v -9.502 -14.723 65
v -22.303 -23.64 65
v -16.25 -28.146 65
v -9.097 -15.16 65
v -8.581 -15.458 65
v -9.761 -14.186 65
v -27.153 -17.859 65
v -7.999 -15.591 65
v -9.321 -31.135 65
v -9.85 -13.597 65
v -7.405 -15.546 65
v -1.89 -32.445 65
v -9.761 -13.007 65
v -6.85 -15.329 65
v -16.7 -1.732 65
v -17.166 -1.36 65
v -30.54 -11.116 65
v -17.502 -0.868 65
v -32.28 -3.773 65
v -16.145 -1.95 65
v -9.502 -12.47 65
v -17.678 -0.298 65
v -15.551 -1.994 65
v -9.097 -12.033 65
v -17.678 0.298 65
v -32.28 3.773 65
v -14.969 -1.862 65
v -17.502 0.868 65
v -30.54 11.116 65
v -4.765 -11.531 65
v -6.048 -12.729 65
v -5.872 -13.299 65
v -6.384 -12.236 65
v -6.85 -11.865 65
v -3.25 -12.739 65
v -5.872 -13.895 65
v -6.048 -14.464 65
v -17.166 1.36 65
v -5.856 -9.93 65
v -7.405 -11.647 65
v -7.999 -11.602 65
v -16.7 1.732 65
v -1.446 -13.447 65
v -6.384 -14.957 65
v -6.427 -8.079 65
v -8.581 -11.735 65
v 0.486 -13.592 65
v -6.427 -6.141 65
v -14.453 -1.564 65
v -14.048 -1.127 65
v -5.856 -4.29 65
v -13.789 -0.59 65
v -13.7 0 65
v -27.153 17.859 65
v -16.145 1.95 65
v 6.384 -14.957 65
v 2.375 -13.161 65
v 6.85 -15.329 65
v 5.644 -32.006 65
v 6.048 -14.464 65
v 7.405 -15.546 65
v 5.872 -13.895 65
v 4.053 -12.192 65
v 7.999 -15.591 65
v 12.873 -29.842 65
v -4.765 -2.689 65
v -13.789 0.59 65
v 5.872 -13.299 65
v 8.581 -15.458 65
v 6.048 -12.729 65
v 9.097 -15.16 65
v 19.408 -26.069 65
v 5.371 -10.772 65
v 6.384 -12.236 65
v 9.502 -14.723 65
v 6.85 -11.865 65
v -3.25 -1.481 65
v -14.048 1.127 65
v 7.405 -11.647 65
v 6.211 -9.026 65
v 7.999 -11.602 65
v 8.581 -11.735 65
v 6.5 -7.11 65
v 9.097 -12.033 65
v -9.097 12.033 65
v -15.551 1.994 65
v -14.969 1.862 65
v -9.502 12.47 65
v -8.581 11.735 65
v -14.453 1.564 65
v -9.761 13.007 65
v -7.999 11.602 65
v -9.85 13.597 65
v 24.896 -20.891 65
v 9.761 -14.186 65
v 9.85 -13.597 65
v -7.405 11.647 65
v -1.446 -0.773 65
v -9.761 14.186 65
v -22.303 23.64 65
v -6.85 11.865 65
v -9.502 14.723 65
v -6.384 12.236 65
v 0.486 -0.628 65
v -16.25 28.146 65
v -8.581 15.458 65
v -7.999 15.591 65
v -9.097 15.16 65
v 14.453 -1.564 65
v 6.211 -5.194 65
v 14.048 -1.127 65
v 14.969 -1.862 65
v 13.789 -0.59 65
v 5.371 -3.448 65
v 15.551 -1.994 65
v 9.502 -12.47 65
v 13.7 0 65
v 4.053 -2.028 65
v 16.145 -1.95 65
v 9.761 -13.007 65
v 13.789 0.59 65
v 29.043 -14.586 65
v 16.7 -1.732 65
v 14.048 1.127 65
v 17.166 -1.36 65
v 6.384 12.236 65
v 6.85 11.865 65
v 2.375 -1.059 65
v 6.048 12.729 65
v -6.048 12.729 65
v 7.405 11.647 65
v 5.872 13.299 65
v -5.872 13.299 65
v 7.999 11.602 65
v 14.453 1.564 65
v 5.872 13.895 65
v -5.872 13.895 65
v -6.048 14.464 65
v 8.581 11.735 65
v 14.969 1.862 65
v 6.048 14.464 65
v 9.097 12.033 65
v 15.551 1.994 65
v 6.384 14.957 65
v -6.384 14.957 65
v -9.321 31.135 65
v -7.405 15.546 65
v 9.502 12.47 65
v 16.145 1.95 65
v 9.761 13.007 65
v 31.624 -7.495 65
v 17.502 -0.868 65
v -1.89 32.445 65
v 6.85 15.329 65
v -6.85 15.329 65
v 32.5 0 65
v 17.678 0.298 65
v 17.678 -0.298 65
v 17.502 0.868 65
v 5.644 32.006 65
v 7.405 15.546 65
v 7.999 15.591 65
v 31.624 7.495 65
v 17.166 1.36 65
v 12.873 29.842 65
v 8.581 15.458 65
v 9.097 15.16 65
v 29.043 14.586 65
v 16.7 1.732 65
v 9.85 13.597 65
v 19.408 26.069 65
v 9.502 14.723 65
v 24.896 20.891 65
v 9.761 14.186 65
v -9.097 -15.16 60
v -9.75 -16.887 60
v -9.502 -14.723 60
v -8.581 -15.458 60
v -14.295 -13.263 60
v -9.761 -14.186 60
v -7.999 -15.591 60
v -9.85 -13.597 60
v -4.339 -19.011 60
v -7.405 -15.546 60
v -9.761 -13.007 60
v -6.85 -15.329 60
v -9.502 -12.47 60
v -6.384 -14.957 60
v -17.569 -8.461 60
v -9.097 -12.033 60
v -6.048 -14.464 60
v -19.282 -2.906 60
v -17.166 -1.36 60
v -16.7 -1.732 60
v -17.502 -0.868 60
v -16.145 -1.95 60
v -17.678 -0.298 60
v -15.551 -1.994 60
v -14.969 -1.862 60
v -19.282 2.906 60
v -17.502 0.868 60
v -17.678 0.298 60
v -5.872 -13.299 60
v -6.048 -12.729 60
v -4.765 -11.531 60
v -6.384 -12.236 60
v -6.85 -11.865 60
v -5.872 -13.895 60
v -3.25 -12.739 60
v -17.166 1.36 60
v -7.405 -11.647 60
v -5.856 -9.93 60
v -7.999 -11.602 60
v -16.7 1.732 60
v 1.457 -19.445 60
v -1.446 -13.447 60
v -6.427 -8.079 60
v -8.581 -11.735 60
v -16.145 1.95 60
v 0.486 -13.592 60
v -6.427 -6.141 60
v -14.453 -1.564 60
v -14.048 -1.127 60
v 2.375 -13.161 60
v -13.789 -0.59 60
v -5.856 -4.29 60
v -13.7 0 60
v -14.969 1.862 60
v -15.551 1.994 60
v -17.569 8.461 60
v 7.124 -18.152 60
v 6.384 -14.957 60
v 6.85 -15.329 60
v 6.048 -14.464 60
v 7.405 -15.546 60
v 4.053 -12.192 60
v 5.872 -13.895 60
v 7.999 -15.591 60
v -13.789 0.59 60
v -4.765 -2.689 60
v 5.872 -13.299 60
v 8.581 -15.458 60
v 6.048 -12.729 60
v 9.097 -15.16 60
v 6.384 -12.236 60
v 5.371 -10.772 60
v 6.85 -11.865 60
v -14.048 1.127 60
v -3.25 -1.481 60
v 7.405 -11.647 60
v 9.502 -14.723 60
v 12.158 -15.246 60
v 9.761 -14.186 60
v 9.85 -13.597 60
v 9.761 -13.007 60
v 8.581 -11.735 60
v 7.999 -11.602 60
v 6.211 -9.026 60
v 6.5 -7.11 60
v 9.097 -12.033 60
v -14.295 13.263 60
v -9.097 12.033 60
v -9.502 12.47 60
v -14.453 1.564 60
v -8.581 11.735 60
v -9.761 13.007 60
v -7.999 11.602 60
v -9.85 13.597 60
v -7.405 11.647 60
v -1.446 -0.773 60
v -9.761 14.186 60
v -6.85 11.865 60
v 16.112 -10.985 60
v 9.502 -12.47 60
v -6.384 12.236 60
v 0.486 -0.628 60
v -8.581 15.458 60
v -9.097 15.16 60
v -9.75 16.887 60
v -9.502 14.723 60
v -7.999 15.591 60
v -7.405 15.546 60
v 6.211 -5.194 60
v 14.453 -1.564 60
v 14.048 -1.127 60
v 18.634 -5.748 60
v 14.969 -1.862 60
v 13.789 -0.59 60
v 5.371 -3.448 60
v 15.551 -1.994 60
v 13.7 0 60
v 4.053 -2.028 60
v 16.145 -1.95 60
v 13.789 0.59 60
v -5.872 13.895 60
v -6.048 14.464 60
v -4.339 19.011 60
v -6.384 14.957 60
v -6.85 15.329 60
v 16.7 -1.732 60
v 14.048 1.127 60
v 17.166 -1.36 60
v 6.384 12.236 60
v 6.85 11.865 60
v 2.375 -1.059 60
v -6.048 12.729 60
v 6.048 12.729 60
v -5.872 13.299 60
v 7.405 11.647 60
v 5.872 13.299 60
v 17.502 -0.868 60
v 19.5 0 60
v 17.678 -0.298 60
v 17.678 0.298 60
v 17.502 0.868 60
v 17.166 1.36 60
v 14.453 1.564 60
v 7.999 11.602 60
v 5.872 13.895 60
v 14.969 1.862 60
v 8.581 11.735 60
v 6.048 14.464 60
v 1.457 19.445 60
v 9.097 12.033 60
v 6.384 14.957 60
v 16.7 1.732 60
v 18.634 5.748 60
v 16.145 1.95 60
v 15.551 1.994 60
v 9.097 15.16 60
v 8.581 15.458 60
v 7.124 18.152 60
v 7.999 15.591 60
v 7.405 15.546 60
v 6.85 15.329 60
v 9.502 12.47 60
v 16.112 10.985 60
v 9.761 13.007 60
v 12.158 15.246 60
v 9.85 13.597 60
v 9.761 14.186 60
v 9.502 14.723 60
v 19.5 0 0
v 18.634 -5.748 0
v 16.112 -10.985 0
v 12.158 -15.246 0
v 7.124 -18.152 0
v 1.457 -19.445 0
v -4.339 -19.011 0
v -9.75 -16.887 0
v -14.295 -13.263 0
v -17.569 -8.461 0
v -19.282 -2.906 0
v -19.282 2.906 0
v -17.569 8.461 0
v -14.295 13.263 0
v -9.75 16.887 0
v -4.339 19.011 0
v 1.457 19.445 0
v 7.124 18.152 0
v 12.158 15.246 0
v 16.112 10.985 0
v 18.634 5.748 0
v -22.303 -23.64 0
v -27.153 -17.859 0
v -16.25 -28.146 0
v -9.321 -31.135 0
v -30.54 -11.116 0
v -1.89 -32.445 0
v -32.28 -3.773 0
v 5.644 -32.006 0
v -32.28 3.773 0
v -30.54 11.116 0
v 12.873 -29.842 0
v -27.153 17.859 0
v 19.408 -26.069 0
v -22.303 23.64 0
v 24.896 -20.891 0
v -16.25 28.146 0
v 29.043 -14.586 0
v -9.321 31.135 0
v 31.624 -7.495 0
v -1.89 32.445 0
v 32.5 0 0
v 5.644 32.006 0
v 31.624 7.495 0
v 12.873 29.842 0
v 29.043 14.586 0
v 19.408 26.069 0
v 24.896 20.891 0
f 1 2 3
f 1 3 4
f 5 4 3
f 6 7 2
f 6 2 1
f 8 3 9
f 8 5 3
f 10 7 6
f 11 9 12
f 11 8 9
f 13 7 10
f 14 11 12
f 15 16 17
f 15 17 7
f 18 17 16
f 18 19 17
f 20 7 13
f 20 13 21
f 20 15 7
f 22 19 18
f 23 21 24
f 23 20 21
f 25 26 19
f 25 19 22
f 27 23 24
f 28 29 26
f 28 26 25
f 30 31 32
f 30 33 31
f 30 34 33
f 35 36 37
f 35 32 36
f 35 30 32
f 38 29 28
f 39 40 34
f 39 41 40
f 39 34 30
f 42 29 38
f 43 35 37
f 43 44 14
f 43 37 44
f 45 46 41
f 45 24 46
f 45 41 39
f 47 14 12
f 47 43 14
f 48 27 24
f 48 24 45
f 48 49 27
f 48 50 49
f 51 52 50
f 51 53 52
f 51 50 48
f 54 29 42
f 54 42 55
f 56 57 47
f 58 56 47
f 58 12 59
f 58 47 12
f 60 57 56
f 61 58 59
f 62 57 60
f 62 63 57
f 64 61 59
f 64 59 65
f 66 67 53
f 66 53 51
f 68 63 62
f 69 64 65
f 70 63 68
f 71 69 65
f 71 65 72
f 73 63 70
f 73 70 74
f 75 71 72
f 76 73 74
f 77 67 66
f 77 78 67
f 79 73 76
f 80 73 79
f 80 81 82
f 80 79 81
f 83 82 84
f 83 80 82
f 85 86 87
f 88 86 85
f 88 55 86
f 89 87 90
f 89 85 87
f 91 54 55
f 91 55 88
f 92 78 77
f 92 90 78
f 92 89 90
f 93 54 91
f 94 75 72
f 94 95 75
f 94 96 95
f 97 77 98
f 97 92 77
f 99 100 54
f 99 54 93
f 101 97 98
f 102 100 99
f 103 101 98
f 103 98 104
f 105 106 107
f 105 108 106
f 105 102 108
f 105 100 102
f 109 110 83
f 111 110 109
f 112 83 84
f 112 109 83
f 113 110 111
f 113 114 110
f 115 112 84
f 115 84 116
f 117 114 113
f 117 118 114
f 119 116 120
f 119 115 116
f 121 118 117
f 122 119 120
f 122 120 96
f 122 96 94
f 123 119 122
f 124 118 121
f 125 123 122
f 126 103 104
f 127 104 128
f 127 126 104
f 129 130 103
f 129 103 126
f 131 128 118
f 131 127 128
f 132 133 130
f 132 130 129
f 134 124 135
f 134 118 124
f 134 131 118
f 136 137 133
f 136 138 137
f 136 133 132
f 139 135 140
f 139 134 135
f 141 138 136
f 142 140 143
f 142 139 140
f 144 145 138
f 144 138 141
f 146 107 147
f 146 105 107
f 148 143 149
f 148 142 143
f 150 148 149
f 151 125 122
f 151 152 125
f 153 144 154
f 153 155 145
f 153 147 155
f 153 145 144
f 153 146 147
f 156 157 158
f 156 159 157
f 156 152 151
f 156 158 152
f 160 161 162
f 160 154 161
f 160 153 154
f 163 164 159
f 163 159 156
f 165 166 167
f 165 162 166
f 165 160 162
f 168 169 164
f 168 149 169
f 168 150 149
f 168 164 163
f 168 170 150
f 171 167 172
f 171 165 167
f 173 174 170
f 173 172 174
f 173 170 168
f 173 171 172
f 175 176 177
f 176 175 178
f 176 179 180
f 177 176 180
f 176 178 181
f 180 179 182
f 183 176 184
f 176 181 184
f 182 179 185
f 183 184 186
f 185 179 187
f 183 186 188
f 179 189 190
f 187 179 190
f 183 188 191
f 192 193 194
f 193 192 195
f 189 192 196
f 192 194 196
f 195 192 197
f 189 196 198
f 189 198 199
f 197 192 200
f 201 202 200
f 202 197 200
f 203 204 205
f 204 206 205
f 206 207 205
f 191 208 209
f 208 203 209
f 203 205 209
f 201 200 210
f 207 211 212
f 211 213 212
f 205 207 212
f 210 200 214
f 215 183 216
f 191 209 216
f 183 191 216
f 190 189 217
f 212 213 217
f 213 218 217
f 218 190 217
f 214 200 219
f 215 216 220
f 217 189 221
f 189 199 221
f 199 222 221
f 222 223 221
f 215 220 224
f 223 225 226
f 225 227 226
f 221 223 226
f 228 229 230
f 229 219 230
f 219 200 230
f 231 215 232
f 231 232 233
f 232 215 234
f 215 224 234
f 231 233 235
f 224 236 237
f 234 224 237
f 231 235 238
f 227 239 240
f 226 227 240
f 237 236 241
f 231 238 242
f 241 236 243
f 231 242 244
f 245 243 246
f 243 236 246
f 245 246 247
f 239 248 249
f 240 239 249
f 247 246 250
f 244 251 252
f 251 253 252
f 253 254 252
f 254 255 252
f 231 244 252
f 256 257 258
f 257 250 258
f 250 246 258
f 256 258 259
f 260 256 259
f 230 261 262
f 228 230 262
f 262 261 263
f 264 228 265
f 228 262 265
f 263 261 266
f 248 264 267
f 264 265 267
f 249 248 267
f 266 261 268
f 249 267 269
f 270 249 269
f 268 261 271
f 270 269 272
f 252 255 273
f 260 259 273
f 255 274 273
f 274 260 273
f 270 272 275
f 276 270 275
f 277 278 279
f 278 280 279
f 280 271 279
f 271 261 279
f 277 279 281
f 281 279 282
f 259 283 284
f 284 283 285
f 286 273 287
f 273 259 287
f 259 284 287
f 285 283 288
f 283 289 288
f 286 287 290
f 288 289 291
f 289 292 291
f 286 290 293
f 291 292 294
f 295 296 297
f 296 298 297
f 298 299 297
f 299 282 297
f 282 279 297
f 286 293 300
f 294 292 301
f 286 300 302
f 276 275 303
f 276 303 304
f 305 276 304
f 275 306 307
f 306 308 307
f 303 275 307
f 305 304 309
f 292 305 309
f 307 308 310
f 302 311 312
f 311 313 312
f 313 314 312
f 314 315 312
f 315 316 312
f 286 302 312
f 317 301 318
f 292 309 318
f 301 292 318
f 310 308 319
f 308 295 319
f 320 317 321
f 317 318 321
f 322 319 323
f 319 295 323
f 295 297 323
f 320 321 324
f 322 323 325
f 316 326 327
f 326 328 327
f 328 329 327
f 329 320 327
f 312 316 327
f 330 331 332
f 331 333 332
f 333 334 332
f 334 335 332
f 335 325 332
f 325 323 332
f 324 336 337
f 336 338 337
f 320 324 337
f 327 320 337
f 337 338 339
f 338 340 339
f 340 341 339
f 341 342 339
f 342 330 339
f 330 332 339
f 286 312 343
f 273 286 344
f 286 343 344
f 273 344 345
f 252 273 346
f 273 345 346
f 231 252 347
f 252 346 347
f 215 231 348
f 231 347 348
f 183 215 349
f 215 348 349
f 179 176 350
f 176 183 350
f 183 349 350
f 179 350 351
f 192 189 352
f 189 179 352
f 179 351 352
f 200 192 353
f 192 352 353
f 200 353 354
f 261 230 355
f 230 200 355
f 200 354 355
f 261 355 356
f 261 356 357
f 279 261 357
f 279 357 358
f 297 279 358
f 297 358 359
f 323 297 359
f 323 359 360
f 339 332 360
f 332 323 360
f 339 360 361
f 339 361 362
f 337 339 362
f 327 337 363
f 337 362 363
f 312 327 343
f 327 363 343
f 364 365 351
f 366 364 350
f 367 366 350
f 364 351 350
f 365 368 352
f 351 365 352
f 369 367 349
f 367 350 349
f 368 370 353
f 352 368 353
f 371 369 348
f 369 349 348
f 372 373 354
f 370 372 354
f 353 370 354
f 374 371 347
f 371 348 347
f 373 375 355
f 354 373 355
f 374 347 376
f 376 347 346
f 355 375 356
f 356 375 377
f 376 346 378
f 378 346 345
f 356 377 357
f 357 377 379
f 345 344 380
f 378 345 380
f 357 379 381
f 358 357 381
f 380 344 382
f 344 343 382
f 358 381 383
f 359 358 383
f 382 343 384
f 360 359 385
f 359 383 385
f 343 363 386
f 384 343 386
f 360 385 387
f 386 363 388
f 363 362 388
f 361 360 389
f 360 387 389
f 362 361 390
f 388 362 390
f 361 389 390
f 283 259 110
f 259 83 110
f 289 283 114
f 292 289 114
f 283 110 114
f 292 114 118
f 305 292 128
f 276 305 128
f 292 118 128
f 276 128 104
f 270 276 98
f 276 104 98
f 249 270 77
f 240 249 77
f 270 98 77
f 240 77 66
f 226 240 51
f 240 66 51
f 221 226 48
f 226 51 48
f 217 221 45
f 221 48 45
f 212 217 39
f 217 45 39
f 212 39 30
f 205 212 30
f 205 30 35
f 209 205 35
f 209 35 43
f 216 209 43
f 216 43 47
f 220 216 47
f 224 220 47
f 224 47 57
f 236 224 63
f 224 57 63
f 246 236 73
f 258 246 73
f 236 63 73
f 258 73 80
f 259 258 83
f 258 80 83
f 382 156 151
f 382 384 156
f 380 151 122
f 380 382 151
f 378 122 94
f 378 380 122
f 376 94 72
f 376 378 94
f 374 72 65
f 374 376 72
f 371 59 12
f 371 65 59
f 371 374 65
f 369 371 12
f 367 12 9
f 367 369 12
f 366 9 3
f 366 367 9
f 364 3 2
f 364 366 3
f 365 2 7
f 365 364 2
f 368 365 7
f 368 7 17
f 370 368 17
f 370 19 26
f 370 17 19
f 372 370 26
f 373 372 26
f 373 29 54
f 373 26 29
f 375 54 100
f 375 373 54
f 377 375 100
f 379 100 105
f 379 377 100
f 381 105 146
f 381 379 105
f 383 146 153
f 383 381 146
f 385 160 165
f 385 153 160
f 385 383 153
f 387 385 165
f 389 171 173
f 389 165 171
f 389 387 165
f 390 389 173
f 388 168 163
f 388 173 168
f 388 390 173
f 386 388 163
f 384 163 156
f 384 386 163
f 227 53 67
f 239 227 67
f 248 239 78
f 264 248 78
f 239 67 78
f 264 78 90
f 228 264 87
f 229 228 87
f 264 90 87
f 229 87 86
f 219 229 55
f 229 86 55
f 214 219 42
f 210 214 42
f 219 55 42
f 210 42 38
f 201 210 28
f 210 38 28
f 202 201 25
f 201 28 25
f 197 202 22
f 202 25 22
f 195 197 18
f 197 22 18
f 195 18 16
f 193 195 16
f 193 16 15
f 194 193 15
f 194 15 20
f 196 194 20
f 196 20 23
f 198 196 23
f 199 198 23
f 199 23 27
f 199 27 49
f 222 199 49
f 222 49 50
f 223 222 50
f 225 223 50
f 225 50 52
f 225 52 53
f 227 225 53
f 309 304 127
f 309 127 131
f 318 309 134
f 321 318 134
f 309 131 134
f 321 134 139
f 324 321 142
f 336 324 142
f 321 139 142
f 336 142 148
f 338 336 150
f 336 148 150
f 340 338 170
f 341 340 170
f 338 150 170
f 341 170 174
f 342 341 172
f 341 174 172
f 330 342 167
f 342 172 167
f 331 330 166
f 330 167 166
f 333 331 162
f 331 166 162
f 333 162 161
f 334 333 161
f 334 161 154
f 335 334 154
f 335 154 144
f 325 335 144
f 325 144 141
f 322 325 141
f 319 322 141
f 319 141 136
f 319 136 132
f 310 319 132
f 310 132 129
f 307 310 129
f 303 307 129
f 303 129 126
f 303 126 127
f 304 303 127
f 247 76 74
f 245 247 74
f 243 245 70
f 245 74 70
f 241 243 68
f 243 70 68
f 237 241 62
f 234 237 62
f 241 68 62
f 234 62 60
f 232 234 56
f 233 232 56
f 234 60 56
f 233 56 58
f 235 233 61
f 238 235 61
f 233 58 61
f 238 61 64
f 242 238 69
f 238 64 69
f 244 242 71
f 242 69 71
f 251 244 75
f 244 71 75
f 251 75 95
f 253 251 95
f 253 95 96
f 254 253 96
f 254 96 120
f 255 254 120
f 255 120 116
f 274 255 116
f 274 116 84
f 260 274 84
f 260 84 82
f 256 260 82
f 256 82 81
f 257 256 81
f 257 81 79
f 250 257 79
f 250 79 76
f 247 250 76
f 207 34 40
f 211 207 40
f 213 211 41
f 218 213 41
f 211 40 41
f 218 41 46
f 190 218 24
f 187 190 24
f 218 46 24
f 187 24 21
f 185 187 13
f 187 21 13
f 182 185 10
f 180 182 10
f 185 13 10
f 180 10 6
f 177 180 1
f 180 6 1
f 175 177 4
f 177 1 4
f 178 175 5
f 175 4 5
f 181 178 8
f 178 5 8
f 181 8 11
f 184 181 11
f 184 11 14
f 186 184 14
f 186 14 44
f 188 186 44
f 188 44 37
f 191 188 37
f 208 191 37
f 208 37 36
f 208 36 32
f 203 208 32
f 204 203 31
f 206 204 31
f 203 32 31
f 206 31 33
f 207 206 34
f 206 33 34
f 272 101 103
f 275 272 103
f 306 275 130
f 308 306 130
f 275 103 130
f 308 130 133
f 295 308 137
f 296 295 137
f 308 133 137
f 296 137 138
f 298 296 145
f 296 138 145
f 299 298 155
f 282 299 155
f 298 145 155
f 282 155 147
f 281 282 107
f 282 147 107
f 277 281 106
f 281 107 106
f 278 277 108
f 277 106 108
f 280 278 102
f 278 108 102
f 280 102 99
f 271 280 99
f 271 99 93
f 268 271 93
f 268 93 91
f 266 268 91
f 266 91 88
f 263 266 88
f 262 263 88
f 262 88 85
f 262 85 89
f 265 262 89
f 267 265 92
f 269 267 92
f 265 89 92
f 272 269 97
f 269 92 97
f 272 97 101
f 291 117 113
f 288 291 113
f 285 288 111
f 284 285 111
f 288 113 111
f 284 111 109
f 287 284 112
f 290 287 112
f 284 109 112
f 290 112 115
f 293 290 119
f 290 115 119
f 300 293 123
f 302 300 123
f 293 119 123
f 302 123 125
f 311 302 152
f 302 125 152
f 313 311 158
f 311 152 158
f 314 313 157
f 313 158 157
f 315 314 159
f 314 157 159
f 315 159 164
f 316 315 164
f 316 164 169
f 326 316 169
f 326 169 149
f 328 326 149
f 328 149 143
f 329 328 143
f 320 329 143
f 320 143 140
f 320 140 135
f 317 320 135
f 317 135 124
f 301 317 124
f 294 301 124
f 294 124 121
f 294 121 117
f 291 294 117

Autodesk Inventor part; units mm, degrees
ref_plane "YZ Plane" through (0, 0, 0) normal (1, 0, 0) x (0, 1, 0)
ref_plane "XZ Plane" through (0, 0, 0) normal (0, 1, 0) x (-1, 0, 0)
ref_plane "XY Plane" through (0, 0, 0) normal (0, 0, 1) x (1, 0, 0)
sketch "Sketch1" plane through (0, 0, 0) normal (0, 0, 1) x (1, 0, 0)
  point P0 (0, 0)
sketch "Sketch2" plane through (0, 0, 0) normal (0, 0, 1) x (1, 0, 0)
  circle A0 centre (0, 0) radius 32.5
  circle A1 centre (0, 0) radius 19.5
  dimension "d0" = 65
  dimension "d1" = 39
extrude "Extrusion1" add sketch "Sketch2" along normal blind 60
sketch "Sketch3" plane through (0, 0, 60) normal (0, 0, 1) x (1, 0, 0)
  circle A0 centre (0, 0) radius 32.5 projected
extrude "Extrusion2" add sketch "Sketch3" along normal blind 5
sketch "Sketch4" plane through (0, 0, 65) normal (0, 0, 1) x (1, 0, 0)
  circle A0 centre (-15.7, 0) radius 2
  circle A1 centre (0, 0) radius 32.5 projected
  point P0 (2.1, 0)
  dimension "d6" = 4
  dimension "d27" = 15.7
extrude "Extrusion3" cut sketch "Sketch4" against normal blind 5 contours A0
sketch "Sketch5" plane through (0, 0, 65) normal (0, 0, 1) x (1, 0, 0)
  circle A0 centre (0, -7.11) radius 6.5
  point P0 (0, 0)
  dimension "d14" = 7.11
  dimension "d15" = 13
extrude "Extrusion4" cut sketch "Sketch5" against normal blind 5
pattern_circular "Circular Pattern1" count 6 over 360 about axis through (0, 0, -10) along (0, 0, 1) of "Extrusion3"
properties part number "SoporteMotor2"
